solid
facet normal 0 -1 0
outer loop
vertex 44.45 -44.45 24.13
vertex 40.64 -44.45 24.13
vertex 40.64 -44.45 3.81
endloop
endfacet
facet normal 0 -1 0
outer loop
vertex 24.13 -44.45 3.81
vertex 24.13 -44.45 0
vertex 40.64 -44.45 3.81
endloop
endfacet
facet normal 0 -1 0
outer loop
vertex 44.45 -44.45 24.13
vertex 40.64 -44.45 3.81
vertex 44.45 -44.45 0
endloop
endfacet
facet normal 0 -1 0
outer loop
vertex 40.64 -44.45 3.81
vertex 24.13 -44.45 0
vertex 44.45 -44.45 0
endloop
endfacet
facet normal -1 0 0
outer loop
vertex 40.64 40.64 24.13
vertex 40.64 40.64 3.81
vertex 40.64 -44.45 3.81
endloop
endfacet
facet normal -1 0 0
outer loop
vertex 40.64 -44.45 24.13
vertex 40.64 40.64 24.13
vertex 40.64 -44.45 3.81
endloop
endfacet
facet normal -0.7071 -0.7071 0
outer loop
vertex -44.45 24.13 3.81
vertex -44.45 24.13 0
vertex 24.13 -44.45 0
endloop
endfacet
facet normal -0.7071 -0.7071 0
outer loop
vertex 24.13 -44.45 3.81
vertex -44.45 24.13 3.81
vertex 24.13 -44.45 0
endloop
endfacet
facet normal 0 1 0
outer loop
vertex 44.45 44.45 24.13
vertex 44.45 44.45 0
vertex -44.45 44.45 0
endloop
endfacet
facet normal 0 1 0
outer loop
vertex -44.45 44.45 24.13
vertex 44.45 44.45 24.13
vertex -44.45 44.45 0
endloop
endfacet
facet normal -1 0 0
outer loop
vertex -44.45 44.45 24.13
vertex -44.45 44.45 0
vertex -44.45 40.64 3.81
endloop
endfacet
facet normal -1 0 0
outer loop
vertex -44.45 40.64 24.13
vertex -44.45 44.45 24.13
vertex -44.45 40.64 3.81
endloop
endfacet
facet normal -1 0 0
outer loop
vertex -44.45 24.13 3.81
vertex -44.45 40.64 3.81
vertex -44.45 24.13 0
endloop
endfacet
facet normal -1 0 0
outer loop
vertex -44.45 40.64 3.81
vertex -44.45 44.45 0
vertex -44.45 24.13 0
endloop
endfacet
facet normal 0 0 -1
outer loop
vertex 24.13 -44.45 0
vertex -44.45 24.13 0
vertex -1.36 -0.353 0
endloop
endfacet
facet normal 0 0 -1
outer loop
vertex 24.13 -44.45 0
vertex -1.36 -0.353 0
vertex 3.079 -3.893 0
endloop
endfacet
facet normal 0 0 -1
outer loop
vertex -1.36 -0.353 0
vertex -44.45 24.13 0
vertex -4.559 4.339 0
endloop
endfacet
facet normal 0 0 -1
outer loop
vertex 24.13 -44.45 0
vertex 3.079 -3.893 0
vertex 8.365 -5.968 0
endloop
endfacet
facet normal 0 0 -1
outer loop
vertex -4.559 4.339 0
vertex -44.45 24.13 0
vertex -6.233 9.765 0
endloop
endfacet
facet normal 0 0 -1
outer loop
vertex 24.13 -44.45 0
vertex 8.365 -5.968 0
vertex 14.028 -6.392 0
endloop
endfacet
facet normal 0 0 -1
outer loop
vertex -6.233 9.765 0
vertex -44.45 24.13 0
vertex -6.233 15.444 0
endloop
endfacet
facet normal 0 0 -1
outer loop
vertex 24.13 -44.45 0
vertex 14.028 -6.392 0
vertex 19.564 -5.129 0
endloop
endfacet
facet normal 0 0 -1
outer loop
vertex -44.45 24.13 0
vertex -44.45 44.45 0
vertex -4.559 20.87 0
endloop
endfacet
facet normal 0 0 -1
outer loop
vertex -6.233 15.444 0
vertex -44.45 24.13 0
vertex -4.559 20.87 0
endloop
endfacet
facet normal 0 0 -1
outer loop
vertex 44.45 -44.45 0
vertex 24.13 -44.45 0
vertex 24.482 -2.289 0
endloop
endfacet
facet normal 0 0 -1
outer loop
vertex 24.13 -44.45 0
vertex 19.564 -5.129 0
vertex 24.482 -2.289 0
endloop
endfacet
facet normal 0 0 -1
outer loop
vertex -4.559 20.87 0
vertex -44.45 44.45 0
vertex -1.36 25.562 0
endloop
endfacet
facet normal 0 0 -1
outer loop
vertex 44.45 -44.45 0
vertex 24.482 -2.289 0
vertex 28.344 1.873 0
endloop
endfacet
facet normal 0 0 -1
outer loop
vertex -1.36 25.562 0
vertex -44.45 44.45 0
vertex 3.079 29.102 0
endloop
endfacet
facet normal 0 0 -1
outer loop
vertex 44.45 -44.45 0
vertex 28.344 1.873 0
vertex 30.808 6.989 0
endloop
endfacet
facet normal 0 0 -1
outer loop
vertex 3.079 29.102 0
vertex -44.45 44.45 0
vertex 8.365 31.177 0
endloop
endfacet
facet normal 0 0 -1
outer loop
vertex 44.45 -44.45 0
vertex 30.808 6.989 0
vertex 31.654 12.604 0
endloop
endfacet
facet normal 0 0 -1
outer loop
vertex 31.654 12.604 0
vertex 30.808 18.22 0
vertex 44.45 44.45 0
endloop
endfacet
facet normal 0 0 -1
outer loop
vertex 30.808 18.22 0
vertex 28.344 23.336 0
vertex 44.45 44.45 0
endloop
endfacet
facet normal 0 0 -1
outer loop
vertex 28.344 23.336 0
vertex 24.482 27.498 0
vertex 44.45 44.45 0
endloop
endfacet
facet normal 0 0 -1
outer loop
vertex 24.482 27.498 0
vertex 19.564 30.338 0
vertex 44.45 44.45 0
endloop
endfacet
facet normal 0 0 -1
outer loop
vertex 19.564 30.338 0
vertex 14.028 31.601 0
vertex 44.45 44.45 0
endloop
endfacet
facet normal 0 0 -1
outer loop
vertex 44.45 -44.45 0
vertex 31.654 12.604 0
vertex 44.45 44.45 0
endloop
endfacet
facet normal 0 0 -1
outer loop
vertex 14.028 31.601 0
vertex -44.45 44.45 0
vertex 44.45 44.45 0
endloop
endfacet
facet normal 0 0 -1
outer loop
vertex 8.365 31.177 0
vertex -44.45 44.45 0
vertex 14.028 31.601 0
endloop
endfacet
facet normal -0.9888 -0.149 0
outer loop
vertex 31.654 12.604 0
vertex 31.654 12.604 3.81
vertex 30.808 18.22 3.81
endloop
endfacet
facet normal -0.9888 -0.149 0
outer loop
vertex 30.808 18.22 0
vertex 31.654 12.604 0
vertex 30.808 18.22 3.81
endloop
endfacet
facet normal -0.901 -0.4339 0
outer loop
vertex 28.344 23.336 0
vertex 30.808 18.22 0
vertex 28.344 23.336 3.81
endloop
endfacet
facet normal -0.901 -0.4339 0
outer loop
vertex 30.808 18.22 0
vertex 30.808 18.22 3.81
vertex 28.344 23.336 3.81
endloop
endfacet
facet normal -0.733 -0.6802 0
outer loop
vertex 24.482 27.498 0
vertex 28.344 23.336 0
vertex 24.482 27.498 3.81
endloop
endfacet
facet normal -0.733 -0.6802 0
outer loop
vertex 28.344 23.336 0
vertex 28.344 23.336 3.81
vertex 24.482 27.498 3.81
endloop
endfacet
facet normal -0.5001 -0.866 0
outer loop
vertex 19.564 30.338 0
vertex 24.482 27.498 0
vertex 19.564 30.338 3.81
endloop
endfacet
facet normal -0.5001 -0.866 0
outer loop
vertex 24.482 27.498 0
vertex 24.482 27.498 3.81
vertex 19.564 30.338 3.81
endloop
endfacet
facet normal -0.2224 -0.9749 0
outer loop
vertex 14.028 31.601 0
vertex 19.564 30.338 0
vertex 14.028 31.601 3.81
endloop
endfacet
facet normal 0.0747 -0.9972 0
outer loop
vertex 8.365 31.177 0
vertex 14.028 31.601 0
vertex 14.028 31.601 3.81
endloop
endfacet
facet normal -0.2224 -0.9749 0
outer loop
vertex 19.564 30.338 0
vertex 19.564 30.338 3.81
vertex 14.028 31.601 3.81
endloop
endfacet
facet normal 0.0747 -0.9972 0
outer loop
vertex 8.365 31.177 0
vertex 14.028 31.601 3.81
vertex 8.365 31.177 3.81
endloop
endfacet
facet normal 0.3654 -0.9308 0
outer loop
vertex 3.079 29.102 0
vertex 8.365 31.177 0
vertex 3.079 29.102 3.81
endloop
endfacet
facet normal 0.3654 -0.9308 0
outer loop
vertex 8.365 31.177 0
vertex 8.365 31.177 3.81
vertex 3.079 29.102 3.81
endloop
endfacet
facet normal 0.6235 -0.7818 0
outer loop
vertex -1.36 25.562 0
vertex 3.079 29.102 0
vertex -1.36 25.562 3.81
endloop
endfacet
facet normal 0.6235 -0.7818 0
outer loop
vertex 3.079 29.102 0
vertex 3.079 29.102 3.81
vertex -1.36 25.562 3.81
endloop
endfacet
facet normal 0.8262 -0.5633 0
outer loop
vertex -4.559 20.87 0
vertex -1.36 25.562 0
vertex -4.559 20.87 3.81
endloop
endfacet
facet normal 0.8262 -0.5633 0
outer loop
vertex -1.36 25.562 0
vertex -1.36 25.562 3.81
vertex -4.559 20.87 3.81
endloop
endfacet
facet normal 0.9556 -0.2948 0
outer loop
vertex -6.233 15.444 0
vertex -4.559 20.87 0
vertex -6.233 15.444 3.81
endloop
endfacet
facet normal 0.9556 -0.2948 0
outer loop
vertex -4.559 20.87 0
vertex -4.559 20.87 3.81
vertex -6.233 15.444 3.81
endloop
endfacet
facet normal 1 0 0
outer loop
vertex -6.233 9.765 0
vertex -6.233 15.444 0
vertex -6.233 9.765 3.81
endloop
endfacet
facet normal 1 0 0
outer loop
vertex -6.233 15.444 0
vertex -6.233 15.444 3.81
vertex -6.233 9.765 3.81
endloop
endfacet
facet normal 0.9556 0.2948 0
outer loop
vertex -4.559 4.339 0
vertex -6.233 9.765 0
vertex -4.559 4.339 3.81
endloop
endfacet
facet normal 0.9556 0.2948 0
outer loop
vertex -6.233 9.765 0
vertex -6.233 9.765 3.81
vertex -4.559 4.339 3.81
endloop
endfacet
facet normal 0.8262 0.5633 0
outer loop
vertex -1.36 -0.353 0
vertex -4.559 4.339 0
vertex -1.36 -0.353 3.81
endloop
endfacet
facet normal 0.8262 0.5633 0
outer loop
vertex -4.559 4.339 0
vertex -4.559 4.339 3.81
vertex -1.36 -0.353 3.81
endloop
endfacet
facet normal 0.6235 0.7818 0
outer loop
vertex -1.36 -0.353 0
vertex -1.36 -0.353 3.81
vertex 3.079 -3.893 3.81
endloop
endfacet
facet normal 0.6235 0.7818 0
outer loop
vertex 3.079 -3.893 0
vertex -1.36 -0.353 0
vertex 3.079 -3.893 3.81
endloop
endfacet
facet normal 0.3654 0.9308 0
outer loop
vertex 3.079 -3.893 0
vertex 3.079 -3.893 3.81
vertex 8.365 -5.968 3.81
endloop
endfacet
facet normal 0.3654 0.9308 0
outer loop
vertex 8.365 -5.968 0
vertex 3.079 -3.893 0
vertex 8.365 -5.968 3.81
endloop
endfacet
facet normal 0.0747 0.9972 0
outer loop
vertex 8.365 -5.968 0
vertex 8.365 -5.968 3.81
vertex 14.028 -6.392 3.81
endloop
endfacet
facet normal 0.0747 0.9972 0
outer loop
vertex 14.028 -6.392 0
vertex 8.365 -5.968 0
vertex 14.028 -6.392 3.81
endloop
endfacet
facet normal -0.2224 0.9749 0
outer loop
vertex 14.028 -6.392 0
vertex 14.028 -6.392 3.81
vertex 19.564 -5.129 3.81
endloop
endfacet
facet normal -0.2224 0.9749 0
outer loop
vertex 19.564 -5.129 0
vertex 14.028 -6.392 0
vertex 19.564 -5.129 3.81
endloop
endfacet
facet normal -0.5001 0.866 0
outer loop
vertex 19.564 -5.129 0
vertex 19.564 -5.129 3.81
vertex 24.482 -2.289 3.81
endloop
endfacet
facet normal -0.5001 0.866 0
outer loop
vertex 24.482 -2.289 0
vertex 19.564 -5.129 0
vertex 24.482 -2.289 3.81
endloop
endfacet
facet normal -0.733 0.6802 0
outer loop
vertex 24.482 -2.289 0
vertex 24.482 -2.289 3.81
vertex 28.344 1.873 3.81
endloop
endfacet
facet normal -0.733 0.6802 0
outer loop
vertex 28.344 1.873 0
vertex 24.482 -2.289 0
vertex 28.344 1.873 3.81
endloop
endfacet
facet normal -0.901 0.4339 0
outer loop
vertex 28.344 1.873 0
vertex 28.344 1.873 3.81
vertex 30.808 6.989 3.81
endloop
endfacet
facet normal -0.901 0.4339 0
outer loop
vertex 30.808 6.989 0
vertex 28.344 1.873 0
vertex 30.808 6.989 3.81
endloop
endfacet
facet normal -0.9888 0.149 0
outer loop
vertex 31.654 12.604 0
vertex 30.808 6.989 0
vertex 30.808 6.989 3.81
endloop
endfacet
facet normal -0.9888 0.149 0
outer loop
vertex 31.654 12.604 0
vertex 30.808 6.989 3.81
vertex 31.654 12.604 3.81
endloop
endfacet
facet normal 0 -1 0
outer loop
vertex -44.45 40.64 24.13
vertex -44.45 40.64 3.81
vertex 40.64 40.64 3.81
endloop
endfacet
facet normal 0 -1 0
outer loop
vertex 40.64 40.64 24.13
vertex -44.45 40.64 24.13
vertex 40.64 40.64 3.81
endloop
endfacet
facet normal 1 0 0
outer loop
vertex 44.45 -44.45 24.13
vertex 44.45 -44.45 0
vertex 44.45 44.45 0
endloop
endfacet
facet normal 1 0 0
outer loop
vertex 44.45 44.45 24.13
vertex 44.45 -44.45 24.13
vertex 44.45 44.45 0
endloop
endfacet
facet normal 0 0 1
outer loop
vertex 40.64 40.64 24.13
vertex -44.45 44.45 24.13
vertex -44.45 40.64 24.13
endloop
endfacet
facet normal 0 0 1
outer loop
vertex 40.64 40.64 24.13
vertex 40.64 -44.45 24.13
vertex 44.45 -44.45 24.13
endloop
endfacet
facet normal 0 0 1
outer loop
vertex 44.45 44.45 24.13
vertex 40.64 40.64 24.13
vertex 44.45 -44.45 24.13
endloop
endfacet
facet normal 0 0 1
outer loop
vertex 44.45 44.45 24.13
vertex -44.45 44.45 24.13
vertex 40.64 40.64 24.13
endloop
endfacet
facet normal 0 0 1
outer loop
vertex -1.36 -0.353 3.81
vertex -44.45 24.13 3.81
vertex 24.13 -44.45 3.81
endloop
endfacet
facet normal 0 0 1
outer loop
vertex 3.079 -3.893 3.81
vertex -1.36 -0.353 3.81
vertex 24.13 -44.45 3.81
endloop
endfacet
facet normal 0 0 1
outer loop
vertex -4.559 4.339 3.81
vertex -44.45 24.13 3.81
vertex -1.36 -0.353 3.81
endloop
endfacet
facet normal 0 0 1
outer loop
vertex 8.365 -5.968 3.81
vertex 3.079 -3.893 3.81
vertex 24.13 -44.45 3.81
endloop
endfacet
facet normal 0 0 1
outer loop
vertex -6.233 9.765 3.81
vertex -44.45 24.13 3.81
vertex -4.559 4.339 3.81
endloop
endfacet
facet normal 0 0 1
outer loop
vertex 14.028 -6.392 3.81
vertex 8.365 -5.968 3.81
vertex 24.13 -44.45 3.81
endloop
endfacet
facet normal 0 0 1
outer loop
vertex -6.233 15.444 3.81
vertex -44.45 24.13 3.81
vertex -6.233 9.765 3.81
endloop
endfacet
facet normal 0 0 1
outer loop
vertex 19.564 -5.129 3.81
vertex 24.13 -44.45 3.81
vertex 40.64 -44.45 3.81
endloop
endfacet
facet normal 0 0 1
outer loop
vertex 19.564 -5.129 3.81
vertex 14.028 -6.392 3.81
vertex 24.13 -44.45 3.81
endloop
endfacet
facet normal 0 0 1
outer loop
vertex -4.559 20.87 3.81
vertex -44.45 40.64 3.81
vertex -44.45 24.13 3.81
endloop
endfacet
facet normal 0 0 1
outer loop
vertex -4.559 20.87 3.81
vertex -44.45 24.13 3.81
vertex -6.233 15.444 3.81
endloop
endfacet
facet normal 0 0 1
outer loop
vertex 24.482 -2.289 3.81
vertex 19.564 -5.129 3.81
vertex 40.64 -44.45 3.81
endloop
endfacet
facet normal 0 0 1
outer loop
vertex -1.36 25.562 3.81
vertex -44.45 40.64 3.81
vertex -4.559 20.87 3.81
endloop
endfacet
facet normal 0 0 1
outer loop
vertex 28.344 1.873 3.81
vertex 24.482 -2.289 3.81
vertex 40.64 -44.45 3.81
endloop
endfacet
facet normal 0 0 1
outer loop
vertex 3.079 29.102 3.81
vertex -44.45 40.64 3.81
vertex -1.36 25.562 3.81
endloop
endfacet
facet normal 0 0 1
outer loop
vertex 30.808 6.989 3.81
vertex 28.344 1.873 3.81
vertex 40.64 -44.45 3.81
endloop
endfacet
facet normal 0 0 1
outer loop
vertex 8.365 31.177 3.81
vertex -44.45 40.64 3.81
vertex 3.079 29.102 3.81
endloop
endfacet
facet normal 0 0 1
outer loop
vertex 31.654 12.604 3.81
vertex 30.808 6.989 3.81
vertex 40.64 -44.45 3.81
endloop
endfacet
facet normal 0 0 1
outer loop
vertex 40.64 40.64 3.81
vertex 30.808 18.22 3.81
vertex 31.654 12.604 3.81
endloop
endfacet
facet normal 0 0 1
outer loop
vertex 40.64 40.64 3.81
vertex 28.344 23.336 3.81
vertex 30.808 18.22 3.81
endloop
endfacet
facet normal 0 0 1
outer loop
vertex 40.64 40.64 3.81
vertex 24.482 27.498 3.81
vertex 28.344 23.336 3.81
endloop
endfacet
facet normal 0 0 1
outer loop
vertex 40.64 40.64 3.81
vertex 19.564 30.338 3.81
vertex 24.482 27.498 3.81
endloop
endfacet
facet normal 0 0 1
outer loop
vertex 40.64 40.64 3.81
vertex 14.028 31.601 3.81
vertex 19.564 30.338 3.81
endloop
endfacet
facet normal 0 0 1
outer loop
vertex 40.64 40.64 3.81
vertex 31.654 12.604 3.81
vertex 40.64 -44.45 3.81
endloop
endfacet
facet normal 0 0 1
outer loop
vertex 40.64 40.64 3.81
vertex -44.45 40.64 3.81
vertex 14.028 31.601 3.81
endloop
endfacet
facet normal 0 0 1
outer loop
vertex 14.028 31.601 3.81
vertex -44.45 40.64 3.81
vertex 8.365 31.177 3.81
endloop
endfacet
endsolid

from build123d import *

# Parameters (mm, degrees)
F1_DEPTH = 3.81
F3_DEPTH = 20.32
F4_R     = 19.05
F5_DEPTH = 39.624


with BuildPart() as f1:
    # F0 (on Top) → F1 (new body)
    with BuildSketch(Plane.XY):
        Polygon((24.13, -44.45), (44.45, -44.45), (44.45, 44.45), (-44.45, 44.45), (-44.45, 24.13), align=None)
    extrude(amount=F1_DEPTH)

    # F2 (on face) → F3 (join)
    with BuildSketch(Plane.XY.offset(3.81)):
        Polygon((40.64, 44.45), (-44.45, 44.45), (-44.45, 40.64), (40.64, 40.64), (40.64, -44.45), (44.45, -44.45), (44.45, 40.64), (44.45, 44.45), align=None)
    extrude(amount=F3_DEPTH)

    # F4 (on face) → F5 (cut)
    with BuildSketch(Plane.XY.offset(3.81)):
        with Locations((12.604465, 12.604465)):
            Circle(F4_R)
    extrude(amount=-F5_DEPTH, mode=Mode.SUBTRACT)


solid = f1.part
